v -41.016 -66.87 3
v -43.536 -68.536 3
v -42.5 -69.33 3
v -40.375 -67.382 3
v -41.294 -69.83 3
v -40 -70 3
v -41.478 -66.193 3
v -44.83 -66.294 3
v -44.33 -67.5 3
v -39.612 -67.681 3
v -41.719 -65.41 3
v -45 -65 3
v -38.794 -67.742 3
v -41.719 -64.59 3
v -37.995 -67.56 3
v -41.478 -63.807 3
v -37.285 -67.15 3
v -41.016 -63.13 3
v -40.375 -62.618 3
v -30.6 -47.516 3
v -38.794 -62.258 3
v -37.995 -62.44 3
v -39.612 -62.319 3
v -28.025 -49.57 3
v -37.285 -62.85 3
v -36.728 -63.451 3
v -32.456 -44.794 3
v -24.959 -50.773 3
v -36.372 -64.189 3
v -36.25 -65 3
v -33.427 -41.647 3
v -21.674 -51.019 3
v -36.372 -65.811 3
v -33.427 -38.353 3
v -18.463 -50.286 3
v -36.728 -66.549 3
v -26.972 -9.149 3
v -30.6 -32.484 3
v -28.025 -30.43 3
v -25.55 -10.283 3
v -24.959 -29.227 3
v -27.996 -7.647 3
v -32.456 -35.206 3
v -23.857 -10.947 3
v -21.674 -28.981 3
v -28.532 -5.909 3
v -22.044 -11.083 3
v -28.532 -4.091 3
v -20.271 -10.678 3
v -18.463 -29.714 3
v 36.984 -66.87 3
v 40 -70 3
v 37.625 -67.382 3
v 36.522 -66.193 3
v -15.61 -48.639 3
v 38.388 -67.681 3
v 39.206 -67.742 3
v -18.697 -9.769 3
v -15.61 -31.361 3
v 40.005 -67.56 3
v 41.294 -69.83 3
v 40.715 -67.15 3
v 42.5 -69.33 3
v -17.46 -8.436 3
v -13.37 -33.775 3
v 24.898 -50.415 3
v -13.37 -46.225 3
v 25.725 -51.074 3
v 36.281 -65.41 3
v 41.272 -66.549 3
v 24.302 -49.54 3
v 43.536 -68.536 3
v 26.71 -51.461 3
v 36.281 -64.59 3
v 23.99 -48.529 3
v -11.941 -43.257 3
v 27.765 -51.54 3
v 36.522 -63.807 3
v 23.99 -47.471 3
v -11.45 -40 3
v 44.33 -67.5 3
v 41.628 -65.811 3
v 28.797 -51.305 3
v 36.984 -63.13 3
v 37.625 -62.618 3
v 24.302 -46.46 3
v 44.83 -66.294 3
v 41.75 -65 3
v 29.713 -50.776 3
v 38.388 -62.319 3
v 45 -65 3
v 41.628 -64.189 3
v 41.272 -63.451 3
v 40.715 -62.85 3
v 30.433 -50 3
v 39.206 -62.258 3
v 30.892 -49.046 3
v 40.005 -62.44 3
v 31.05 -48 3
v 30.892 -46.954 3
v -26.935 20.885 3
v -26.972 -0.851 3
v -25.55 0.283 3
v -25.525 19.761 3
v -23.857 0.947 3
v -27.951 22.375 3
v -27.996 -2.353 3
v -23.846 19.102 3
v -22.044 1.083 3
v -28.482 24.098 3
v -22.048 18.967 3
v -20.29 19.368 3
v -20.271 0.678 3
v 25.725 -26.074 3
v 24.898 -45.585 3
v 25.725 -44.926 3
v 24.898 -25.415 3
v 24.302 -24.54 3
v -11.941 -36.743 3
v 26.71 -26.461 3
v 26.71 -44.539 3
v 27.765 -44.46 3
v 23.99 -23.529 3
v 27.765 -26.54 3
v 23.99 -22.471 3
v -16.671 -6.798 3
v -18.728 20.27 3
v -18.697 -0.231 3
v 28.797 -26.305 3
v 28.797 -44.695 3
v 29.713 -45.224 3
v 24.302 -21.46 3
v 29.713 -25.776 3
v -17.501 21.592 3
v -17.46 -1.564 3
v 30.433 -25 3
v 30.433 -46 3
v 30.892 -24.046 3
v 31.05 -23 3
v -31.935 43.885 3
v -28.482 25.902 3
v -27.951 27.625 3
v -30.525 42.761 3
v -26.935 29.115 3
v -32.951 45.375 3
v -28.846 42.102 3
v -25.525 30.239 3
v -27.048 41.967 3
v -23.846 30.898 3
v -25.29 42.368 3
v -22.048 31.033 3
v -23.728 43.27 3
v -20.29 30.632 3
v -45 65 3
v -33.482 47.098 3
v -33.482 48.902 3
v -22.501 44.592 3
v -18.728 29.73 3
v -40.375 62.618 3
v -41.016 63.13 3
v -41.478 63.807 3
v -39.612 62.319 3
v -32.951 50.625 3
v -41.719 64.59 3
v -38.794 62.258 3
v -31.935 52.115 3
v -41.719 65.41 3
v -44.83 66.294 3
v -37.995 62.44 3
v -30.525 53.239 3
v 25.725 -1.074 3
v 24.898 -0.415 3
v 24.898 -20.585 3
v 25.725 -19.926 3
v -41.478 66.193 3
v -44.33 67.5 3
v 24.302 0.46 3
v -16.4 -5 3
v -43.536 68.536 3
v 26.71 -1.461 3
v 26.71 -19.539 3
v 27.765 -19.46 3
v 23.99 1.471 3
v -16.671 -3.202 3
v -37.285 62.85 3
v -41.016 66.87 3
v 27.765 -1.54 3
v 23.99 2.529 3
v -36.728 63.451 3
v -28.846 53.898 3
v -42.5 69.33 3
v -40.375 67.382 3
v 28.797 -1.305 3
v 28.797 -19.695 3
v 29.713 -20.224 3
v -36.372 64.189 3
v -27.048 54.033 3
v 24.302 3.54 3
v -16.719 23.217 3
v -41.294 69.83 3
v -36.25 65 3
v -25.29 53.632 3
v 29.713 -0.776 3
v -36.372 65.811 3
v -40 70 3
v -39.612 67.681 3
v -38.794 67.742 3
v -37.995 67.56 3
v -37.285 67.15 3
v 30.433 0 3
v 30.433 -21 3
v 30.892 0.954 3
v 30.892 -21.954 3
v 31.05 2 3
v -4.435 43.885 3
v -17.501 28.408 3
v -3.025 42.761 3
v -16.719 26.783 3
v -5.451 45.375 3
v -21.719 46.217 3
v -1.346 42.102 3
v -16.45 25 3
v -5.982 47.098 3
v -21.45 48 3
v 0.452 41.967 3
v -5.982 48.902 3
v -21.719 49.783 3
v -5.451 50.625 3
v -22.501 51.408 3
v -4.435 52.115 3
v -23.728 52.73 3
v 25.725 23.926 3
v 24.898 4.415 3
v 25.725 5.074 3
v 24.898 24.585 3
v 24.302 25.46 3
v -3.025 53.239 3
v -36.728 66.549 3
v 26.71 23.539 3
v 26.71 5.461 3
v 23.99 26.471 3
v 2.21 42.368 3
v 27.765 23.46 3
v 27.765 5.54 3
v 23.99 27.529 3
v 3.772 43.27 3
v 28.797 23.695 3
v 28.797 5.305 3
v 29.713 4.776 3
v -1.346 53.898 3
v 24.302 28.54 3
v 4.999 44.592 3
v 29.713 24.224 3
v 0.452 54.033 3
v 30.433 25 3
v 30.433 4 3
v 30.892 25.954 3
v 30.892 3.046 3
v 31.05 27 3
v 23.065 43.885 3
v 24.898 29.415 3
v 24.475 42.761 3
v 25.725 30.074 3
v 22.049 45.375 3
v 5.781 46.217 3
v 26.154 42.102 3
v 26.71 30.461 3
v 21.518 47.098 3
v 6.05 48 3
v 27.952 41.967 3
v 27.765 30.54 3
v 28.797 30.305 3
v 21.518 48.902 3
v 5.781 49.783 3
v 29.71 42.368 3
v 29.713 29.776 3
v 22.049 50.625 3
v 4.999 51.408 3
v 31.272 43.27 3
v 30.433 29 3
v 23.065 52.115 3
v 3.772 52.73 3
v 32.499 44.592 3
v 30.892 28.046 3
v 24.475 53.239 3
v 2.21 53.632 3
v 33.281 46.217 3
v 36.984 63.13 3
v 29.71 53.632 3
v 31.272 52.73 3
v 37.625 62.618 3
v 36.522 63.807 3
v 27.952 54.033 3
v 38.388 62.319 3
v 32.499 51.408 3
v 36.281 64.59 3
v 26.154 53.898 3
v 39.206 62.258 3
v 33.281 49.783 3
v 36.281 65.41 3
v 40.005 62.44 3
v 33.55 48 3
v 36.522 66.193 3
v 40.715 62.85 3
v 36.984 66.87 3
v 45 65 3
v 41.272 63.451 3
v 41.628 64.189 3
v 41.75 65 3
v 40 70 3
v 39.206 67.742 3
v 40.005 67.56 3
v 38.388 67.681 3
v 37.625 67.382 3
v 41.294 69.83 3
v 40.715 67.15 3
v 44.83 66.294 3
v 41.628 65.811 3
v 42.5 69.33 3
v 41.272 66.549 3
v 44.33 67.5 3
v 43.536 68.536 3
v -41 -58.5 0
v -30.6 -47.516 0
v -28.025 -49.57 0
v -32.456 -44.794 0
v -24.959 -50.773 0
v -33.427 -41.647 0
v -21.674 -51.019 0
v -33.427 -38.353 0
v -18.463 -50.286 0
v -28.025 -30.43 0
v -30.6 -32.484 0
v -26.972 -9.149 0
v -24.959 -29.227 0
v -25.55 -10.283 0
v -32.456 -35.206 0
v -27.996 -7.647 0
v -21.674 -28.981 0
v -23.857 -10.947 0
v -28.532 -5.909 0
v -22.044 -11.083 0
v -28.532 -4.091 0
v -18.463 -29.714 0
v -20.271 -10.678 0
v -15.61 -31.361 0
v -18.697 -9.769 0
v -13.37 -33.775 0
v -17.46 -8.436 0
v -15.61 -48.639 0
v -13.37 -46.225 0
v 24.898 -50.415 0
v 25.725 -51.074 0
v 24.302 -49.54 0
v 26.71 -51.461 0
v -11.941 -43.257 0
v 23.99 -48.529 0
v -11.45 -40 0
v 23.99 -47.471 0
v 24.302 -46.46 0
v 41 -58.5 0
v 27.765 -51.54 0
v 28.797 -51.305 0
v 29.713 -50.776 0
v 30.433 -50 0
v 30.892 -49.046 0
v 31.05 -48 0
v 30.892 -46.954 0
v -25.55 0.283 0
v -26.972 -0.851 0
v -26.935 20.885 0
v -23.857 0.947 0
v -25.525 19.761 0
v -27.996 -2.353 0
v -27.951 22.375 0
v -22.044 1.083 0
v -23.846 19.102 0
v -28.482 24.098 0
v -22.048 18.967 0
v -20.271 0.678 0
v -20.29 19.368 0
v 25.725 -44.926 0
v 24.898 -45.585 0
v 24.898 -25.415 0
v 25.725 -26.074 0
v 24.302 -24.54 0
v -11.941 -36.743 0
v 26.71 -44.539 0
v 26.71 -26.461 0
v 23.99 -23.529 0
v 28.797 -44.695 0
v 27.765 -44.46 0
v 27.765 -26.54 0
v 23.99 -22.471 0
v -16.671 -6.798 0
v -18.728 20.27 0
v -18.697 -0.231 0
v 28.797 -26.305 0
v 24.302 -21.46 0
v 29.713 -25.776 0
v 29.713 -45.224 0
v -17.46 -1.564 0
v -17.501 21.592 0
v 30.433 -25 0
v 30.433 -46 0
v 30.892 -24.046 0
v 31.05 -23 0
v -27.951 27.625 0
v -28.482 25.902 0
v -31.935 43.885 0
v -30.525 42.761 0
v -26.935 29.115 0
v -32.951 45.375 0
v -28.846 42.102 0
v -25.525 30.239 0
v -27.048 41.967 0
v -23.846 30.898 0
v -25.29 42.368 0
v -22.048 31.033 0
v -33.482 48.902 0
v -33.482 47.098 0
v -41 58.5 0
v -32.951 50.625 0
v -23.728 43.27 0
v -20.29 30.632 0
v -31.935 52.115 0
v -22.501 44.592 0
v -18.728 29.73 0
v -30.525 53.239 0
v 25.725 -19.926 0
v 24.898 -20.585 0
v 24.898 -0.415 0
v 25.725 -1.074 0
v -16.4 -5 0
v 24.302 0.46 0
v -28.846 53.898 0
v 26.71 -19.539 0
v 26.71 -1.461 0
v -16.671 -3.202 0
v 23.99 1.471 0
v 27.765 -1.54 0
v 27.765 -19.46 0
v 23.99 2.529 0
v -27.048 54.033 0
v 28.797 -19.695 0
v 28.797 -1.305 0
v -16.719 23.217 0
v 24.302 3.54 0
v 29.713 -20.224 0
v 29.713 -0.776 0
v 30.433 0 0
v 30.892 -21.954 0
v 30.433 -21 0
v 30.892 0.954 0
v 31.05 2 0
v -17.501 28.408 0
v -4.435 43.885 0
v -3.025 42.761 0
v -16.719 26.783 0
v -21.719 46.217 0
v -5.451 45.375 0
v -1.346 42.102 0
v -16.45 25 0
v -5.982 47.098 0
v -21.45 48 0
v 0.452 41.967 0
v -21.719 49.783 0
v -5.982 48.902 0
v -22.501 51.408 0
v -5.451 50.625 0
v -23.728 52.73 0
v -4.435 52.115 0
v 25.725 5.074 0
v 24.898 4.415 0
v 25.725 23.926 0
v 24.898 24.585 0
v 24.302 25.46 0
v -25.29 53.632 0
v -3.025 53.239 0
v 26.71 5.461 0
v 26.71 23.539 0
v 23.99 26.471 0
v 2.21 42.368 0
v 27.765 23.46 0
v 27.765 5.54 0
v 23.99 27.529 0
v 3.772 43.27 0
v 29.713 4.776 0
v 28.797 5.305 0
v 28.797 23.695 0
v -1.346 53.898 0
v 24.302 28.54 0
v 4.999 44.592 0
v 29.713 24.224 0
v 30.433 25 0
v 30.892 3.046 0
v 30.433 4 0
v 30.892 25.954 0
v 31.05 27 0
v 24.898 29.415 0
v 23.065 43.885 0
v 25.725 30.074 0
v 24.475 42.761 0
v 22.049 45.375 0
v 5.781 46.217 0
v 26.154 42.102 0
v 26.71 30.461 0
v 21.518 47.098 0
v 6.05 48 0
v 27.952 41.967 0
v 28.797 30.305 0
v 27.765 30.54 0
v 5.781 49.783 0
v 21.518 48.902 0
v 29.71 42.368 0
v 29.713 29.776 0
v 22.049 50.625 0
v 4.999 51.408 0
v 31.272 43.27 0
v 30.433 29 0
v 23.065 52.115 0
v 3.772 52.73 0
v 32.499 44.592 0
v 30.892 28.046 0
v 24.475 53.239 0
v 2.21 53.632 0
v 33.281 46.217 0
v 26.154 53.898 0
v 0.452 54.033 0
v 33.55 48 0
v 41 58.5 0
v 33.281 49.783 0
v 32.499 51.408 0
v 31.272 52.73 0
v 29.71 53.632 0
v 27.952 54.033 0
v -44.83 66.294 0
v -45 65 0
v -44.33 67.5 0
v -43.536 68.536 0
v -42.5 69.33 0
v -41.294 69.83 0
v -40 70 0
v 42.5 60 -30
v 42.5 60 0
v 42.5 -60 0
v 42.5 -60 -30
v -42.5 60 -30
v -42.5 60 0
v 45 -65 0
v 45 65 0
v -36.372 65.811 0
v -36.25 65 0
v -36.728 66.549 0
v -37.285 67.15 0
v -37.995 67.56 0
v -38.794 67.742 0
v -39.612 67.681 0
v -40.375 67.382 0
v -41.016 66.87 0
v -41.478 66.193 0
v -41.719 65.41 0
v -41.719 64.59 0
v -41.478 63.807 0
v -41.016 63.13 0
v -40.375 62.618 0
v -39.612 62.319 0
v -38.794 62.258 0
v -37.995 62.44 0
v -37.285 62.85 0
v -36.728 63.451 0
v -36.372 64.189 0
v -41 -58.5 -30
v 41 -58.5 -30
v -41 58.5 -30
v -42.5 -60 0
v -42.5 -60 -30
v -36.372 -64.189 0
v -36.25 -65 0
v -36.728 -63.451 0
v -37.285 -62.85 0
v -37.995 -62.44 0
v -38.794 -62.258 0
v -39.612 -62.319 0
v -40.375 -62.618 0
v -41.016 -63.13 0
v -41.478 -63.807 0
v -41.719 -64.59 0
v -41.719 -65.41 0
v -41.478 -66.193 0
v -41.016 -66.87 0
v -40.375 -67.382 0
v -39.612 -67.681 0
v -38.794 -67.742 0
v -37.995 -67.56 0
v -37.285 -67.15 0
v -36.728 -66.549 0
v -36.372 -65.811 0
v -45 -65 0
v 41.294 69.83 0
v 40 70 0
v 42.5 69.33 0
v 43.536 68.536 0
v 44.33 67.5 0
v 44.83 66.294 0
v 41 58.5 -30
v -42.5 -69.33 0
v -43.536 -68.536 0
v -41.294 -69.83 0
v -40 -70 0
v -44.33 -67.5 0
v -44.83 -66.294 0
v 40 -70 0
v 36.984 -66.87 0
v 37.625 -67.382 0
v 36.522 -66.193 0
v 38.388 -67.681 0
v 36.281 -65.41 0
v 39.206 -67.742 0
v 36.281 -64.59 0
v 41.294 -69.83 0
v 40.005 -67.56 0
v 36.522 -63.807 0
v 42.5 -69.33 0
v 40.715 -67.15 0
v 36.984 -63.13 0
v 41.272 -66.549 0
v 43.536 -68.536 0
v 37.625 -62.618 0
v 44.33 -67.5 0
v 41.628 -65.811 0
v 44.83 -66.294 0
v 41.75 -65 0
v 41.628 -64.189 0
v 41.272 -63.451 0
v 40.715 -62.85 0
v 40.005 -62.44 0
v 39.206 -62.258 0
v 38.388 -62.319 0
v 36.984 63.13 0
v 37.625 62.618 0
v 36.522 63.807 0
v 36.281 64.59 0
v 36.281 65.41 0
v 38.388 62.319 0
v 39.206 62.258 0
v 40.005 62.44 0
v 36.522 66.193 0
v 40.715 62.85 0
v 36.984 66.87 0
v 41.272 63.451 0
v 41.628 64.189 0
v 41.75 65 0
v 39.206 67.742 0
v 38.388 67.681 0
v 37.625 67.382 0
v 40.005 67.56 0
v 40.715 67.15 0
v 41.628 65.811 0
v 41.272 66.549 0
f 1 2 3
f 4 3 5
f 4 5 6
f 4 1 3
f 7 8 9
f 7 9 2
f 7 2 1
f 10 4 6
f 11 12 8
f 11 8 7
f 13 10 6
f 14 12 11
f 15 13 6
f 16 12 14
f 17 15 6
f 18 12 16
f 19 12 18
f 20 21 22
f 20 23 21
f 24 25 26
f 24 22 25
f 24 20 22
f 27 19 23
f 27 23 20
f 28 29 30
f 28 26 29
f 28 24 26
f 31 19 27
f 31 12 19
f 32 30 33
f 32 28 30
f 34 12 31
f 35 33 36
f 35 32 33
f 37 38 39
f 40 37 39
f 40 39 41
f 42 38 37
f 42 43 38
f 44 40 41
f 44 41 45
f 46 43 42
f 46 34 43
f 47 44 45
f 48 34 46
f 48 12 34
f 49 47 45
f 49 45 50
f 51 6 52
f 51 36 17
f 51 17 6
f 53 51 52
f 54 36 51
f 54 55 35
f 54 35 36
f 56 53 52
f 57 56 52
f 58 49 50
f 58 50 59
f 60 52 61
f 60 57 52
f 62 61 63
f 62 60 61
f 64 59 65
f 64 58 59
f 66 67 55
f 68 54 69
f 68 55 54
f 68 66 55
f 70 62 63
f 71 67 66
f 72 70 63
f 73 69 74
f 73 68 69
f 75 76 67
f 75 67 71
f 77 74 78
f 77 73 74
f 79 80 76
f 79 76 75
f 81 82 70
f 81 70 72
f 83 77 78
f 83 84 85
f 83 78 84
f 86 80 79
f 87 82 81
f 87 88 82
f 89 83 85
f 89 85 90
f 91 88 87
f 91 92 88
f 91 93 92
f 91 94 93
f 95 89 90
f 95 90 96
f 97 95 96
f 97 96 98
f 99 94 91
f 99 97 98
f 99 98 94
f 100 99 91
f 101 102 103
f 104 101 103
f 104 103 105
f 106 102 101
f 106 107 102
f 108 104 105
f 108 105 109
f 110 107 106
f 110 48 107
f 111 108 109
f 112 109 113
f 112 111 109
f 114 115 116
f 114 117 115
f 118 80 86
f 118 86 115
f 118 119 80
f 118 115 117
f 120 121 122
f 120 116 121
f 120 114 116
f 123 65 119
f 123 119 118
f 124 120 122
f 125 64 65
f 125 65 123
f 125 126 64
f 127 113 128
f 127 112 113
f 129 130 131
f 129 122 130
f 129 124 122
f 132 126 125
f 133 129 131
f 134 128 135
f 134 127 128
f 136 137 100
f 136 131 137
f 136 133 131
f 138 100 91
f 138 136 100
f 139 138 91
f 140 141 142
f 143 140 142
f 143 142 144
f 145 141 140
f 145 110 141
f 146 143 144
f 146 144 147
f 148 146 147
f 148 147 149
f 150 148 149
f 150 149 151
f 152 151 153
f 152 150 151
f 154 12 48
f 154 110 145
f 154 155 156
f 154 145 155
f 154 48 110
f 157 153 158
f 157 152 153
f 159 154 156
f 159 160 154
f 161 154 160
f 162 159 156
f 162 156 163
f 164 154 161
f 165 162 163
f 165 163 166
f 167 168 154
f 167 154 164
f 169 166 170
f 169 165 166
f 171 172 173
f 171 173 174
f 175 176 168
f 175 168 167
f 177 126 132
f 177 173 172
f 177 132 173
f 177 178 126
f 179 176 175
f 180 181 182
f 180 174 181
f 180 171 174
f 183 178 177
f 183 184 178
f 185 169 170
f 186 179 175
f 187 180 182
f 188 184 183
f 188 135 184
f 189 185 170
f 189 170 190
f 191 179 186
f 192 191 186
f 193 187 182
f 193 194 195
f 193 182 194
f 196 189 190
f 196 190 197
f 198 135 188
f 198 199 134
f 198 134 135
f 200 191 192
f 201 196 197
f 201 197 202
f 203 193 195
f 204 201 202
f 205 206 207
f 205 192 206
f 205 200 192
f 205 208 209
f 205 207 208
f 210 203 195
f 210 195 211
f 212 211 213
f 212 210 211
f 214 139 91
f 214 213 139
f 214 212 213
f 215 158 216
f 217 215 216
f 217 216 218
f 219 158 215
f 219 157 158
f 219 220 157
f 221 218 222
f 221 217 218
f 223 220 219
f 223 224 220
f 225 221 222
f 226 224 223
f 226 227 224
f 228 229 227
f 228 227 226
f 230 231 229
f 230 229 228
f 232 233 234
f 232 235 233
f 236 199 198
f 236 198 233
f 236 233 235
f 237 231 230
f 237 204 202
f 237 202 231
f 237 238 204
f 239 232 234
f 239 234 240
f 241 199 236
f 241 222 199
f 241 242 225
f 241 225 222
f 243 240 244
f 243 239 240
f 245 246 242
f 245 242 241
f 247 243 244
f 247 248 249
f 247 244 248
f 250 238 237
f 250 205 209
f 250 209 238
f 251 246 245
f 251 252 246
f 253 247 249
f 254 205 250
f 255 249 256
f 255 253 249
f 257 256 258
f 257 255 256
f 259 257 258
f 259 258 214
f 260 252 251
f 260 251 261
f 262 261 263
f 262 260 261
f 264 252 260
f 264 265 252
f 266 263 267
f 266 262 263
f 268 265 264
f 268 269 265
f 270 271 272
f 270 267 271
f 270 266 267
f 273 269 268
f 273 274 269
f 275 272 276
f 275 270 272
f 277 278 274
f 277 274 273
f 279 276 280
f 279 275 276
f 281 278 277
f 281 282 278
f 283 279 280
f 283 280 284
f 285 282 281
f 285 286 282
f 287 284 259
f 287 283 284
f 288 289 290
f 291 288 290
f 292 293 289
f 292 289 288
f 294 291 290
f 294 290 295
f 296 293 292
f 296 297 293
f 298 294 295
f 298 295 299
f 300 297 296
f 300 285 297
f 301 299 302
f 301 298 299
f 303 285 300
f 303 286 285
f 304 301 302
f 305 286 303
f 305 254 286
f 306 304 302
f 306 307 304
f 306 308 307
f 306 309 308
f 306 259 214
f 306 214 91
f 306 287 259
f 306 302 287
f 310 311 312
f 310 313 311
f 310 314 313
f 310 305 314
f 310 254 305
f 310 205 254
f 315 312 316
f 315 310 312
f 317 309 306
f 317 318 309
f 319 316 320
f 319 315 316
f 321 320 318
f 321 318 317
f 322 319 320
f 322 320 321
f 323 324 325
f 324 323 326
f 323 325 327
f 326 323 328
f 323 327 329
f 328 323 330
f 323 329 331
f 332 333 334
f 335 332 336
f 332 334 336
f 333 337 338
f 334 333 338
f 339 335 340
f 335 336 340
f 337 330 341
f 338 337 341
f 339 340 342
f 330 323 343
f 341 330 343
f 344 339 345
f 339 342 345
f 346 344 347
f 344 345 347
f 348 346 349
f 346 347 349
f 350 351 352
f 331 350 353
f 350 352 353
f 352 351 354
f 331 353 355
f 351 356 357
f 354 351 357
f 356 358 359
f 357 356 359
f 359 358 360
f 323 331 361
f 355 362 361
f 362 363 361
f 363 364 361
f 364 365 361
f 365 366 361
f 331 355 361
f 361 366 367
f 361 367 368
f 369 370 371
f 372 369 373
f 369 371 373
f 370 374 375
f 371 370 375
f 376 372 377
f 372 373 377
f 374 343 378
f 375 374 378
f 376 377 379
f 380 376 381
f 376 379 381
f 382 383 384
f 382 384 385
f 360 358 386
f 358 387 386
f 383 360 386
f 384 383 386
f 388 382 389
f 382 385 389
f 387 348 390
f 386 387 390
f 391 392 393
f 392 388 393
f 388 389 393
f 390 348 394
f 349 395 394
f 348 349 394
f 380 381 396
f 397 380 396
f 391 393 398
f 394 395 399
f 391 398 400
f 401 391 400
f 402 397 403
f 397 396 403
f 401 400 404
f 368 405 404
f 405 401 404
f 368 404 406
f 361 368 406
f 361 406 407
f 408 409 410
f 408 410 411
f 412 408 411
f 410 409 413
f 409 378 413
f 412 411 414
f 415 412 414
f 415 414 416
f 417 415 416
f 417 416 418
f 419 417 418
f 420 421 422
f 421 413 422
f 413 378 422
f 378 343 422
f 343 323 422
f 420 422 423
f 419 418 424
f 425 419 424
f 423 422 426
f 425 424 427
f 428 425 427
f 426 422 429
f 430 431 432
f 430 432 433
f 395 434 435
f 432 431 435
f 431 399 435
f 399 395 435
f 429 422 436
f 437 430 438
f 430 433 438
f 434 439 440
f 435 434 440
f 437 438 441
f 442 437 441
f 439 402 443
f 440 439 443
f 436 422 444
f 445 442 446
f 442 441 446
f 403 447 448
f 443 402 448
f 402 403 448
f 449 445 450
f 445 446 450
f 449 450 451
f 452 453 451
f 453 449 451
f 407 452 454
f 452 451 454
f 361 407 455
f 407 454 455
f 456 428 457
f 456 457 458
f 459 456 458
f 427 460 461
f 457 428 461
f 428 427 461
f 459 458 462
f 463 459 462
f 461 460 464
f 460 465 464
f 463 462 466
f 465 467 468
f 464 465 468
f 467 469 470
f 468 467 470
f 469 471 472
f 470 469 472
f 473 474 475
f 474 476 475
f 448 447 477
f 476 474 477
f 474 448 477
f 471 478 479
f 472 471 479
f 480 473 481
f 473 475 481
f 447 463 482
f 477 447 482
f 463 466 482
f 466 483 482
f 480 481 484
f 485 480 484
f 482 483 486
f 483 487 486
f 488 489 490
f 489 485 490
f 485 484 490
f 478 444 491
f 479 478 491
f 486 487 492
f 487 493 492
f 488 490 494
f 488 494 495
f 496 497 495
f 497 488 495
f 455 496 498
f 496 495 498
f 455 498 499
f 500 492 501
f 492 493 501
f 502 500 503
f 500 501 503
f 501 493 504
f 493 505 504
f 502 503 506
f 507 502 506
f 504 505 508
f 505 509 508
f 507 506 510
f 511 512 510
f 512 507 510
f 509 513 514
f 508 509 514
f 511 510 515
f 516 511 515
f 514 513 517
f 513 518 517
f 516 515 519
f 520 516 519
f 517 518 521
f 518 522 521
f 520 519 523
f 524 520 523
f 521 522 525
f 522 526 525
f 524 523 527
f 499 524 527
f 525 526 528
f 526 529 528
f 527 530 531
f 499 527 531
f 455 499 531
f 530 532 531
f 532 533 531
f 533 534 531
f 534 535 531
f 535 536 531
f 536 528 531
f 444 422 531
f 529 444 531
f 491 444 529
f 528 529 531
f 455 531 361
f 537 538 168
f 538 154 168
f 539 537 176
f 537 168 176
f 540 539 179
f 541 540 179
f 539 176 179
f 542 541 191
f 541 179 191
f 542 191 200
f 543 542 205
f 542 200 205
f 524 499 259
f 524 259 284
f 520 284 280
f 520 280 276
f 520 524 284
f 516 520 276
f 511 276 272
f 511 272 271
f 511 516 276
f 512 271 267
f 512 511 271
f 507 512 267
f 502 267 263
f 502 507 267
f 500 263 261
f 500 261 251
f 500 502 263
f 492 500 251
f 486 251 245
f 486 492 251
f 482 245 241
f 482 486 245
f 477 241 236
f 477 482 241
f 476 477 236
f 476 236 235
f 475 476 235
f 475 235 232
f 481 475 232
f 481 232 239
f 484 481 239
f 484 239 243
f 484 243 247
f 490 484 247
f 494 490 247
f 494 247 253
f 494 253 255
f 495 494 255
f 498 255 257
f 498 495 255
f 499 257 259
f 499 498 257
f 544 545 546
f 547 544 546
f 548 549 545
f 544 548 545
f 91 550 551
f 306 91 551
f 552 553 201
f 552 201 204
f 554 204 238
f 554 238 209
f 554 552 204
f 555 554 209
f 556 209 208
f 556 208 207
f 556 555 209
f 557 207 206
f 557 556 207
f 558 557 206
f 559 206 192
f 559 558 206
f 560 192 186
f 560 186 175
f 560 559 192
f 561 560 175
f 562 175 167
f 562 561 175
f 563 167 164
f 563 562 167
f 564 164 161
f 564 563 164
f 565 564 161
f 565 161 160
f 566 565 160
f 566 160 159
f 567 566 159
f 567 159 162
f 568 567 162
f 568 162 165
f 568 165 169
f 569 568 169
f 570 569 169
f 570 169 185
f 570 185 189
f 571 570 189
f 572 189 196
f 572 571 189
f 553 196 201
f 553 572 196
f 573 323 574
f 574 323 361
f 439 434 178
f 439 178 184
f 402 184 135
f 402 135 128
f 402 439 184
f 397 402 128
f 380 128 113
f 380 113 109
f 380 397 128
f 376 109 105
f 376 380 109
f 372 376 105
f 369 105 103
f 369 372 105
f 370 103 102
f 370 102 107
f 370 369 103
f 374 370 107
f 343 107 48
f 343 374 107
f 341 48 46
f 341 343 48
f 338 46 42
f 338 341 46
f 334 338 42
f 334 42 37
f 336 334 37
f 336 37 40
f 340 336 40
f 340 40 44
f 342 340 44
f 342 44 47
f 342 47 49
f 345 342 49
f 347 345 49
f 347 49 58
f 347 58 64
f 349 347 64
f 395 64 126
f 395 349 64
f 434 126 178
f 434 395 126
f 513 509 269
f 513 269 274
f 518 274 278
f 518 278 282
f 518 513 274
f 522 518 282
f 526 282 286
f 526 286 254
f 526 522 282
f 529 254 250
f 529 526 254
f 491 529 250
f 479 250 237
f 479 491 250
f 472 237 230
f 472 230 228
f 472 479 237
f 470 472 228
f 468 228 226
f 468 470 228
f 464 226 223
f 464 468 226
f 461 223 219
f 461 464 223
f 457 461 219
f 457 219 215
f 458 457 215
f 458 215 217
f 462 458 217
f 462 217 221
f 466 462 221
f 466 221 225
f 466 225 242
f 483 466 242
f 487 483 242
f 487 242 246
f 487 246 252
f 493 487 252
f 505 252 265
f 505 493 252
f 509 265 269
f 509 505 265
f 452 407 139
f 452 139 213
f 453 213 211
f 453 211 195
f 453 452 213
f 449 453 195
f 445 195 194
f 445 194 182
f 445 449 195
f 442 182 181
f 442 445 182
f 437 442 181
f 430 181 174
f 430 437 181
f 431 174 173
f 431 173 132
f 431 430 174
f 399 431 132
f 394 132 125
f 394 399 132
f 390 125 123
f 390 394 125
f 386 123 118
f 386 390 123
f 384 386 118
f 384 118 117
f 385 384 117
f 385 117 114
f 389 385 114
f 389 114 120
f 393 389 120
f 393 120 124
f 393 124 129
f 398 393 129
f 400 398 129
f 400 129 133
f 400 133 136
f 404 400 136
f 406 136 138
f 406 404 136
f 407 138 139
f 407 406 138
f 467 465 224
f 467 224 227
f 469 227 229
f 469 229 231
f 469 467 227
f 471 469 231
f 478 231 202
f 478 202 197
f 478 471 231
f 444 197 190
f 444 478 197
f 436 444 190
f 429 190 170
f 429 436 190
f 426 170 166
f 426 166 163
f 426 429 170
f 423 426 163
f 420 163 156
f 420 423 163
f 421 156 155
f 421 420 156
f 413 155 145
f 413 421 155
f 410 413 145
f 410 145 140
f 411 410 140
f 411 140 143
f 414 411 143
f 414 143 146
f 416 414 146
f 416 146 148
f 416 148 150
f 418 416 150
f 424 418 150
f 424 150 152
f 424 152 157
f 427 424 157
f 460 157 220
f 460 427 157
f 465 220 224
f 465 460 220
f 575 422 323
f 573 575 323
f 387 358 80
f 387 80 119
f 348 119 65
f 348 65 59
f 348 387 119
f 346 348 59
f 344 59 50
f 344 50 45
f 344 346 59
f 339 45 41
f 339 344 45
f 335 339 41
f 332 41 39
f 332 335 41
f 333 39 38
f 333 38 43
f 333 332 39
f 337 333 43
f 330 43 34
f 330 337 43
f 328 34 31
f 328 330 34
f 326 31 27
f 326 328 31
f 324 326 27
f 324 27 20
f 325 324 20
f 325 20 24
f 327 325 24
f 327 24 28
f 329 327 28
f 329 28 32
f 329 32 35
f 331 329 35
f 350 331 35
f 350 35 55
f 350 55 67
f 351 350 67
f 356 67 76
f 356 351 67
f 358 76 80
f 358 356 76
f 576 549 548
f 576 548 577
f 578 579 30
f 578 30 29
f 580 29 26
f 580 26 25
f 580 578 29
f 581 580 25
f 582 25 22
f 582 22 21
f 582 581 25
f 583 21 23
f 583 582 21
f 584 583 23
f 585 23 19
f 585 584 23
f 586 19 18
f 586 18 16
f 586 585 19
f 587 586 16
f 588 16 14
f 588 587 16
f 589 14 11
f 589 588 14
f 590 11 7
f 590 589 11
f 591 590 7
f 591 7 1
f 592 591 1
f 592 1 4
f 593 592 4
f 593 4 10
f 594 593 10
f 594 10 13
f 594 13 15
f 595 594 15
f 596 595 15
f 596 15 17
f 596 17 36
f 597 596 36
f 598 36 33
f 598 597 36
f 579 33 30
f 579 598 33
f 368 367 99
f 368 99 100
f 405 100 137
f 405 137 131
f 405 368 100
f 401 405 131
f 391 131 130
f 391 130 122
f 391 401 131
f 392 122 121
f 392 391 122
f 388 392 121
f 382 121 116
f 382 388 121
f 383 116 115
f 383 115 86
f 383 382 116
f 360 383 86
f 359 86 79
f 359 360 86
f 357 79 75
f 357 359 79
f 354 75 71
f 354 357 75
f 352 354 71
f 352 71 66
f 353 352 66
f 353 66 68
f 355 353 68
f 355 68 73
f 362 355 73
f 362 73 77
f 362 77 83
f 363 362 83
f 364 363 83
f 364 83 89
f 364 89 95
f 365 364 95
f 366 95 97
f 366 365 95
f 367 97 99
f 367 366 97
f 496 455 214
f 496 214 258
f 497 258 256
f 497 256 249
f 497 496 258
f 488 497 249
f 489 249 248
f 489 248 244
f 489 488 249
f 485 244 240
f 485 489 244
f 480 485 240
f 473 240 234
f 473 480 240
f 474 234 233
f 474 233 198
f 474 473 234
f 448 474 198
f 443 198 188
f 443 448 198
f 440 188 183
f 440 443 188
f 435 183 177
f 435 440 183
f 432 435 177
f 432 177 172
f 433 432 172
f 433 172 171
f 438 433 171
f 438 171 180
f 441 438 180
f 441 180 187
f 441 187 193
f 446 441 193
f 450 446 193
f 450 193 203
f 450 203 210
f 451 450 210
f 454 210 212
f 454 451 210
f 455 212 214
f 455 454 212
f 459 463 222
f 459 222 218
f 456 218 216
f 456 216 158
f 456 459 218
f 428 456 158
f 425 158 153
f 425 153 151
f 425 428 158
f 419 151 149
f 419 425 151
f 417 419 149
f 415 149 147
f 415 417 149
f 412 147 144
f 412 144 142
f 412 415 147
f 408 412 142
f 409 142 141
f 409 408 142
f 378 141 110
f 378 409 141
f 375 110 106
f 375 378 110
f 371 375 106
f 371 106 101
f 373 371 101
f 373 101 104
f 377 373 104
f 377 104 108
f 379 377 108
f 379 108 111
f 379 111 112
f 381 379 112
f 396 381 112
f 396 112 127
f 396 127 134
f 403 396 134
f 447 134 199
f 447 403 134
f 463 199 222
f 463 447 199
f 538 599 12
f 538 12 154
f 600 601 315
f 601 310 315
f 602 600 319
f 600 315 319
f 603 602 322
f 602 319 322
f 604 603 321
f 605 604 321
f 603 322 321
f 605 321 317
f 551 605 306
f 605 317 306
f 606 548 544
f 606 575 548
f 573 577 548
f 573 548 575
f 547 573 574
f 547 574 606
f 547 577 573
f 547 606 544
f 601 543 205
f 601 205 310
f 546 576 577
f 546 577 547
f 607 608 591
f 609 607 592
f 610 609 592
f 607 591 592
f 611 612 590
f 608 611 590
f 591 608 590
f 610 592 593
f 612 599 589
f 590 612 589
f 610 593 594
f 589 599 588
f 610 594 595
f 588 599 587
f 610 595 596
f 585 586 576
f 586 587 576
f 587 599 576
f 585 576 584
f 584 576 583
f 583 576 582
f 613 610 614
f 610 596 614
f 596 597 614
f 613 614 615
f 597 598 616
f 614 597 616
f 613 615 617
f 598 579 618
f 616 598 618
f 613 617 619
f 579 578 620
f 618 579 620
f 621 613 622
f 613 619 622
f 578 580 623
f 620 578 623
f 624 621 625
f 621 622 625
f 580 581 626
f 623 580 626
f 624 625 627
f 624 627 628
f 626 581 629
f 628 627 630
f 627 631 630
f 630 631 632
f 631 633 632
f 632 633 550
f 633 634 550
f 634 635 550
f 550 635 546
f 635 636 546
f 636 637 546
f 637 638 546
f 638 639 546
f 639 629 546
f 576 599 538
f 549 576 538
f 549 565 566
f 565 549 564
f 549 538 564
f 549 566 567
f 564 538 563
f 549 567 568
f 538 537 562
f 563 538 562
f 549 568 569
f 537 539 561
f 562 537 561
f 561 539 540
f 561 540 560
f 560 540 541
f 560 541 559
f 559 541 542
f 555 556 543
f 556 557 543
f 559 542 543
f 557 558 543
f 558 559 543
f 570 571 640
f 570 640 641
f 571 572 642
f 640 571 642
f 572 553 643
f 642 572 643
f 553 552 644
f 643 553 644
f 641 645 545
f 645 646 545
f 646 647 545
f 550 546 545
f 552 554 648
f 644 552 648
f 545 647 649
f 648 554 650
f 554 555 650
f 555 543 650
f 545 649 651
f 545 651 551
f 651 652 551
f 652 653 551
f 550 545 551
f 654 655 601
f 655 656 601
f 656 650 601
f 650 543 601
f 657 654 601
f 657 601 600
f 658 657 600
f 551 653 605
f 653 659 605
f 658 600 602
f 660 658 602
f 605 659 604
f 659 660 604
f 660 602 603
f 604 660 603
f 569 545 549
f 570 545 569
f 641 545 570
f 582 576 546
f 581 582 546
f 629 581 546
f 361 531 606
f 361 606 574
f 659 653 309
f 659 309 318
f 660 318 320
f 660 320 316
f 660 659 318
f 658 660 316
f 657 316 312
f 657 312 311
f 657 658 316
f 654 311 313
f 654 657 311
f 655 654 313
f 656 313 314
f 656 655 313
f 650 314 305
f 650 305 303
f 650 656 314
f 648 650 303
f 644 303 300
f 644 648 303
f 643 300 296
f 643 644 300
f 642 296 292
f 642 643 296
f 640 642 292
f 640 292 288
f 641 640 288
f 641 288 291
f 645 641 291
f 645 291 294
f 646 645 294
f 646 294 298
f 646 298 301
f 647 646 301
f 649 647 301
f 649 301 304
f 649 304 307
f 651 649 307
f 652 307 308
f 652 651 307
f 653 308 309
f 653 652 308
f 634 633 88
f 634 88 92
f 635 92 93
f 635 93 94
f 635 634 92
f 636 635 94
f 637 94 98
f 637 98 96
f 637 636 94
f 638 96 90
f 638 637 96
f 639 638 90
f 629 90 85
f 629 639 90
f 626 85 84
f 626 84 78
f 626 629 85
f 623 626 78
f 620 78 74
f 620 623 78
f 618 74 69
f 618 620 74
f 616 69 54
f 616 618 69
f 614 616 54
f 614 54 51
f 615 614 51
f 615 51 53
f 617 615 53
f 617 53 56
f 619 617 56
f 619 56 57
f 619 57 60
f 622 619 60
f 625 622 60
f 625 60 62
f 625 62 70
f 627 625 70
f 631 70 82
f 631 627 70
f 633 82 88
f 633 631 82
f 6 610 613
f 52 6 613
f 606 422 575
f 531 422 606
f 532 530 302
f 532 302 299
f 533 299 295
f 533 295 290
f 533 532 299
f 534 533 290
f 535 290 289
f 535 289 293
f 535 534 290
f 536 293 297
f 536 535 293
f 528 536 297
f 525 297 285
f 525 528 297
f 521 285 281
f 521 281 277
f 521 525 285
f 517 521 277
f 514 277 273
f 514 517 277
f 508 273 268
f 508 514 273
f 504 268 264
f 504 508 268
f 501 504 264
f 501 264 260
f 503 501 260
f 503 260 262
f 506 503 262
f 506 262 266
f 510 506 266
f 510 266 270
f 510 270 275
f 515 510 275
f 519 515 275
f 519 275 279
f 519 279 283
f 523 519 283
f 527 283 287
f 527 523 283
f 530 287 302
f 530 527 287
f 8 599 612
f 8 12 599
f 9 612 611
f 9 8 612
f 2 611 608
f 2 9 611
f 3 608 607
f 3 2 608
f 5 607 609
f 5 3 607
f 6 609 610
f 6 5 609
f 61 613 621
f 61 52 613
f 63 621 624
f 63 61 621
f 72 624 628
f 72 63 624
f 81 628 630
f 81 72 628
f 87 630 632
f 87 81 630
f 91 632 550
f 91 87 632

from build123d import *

# Parameters (mm, degrees)
SKETCH031_W   = 90
SKETCH031_H   = 140
SKETCH031_R   = 11.05
SKETCH031_R_2 = 2.75
SKETCH031_R_3 = 6.1
SKETCH031_R_4 = 6.05
SKETCH031_R_5 = 3.55
PAD014_DEPTH  = 3
SKETCH032_W   = 85
SKETCH032_H   = 120
SKETCH032_W_2 = 82
SKETCH032_H_2 = 117
PAD015_DEPTH  = 30
FILLET014_R   = 5


with BuildPart() as part:
    # Sketch031 → Pad014 (new body)
    with BuildSketch(Plane.XY):
        Rectangle(SKETCH031_W, SKETCH031_H)
        with Locations((-22.5, -40)):
            Circle(SKETCH031_R, mode=Mode.SUBTRACT)
        with Locations((-39, 65)):
            Circle(SKETCH031_R_2, mode=Mode.SUBTRACT)
        with Locations((39, 65)):
            Circle(SKETCH031_R_2, mode=Mode.SUBTRACT)
        with Locations((39, -65)):
            Circle(SKETCH031_R_2, mode=Mode.SUBTRACT)
        with Locations((-39, -65)):
            Circle(SKETCH031_R_2, mode=Mode.SUBTRACT)
        with Locations((-22.5, -5)):
            Circle(SKETCH031_R_3, mode=Mode.SUBTRACT)
        with Locations((-27.5, 48)):
            Circle(SKETCH031_R_4, mode=Mode.SUBTRACT)
        with Locations((0, 48)):
            Circle(SKETCH031_R_4, mode=Mode.SUBTRACT)
        with Locations((27.5, 48)):
            Circle(SKETCH031_R_4, mode=Mode.SUBTRACT)
        with Locations((27.5, -48)):
            Circle(SKETCH031_R_5, mode=Mode.SUBTRACT)
        with Locations((27.5, -23)):
            Circle(SKETCH031_R_5, mode=Mode.SUBTRACT)
        with Locations((27.5, 2)):
            Circle(SKETCH031_R_5, mode=Mode.SUBTRACT)
        with Locations((27.5, 27)):
            Circle(SKETCH031_R_5, mode=Mode.SUBTRACT)
        with Locations((-22.5, 25)):
            Circle(SKETCH031_R_4, mode=Mode.SUBTRACT)
    extrude(amount=PAD014_DEPTH)

    # Sketch032 (on Face19 of Pad014) → Pad015 (join)
    with BuildSketch(Plane(origin=(0, 0, 0), x_dir=(1, 0, 0), z_dir=(0, 0, -1))):
        Rectangle(SKETCH032_W, SKETCH032_H)
        Rectangle(SKETCH032_W_2, SKETCH032_H_2, mode=Mode.SUBTRACT)
    extrude(amount=PAD015_DEPTH)

    # Fillet014
    fillet014_edges = [part.edges().sort_by_distance(p)[0] for p in [
        (45, 70, 1.5),
        (-45, 70, 1.5),
        (45, -70, 1.5),
        (-45, -70, 1.5),
    ]]
    fillet(fillet014_edges, radius=FILLET014_R)


solid = part.part
